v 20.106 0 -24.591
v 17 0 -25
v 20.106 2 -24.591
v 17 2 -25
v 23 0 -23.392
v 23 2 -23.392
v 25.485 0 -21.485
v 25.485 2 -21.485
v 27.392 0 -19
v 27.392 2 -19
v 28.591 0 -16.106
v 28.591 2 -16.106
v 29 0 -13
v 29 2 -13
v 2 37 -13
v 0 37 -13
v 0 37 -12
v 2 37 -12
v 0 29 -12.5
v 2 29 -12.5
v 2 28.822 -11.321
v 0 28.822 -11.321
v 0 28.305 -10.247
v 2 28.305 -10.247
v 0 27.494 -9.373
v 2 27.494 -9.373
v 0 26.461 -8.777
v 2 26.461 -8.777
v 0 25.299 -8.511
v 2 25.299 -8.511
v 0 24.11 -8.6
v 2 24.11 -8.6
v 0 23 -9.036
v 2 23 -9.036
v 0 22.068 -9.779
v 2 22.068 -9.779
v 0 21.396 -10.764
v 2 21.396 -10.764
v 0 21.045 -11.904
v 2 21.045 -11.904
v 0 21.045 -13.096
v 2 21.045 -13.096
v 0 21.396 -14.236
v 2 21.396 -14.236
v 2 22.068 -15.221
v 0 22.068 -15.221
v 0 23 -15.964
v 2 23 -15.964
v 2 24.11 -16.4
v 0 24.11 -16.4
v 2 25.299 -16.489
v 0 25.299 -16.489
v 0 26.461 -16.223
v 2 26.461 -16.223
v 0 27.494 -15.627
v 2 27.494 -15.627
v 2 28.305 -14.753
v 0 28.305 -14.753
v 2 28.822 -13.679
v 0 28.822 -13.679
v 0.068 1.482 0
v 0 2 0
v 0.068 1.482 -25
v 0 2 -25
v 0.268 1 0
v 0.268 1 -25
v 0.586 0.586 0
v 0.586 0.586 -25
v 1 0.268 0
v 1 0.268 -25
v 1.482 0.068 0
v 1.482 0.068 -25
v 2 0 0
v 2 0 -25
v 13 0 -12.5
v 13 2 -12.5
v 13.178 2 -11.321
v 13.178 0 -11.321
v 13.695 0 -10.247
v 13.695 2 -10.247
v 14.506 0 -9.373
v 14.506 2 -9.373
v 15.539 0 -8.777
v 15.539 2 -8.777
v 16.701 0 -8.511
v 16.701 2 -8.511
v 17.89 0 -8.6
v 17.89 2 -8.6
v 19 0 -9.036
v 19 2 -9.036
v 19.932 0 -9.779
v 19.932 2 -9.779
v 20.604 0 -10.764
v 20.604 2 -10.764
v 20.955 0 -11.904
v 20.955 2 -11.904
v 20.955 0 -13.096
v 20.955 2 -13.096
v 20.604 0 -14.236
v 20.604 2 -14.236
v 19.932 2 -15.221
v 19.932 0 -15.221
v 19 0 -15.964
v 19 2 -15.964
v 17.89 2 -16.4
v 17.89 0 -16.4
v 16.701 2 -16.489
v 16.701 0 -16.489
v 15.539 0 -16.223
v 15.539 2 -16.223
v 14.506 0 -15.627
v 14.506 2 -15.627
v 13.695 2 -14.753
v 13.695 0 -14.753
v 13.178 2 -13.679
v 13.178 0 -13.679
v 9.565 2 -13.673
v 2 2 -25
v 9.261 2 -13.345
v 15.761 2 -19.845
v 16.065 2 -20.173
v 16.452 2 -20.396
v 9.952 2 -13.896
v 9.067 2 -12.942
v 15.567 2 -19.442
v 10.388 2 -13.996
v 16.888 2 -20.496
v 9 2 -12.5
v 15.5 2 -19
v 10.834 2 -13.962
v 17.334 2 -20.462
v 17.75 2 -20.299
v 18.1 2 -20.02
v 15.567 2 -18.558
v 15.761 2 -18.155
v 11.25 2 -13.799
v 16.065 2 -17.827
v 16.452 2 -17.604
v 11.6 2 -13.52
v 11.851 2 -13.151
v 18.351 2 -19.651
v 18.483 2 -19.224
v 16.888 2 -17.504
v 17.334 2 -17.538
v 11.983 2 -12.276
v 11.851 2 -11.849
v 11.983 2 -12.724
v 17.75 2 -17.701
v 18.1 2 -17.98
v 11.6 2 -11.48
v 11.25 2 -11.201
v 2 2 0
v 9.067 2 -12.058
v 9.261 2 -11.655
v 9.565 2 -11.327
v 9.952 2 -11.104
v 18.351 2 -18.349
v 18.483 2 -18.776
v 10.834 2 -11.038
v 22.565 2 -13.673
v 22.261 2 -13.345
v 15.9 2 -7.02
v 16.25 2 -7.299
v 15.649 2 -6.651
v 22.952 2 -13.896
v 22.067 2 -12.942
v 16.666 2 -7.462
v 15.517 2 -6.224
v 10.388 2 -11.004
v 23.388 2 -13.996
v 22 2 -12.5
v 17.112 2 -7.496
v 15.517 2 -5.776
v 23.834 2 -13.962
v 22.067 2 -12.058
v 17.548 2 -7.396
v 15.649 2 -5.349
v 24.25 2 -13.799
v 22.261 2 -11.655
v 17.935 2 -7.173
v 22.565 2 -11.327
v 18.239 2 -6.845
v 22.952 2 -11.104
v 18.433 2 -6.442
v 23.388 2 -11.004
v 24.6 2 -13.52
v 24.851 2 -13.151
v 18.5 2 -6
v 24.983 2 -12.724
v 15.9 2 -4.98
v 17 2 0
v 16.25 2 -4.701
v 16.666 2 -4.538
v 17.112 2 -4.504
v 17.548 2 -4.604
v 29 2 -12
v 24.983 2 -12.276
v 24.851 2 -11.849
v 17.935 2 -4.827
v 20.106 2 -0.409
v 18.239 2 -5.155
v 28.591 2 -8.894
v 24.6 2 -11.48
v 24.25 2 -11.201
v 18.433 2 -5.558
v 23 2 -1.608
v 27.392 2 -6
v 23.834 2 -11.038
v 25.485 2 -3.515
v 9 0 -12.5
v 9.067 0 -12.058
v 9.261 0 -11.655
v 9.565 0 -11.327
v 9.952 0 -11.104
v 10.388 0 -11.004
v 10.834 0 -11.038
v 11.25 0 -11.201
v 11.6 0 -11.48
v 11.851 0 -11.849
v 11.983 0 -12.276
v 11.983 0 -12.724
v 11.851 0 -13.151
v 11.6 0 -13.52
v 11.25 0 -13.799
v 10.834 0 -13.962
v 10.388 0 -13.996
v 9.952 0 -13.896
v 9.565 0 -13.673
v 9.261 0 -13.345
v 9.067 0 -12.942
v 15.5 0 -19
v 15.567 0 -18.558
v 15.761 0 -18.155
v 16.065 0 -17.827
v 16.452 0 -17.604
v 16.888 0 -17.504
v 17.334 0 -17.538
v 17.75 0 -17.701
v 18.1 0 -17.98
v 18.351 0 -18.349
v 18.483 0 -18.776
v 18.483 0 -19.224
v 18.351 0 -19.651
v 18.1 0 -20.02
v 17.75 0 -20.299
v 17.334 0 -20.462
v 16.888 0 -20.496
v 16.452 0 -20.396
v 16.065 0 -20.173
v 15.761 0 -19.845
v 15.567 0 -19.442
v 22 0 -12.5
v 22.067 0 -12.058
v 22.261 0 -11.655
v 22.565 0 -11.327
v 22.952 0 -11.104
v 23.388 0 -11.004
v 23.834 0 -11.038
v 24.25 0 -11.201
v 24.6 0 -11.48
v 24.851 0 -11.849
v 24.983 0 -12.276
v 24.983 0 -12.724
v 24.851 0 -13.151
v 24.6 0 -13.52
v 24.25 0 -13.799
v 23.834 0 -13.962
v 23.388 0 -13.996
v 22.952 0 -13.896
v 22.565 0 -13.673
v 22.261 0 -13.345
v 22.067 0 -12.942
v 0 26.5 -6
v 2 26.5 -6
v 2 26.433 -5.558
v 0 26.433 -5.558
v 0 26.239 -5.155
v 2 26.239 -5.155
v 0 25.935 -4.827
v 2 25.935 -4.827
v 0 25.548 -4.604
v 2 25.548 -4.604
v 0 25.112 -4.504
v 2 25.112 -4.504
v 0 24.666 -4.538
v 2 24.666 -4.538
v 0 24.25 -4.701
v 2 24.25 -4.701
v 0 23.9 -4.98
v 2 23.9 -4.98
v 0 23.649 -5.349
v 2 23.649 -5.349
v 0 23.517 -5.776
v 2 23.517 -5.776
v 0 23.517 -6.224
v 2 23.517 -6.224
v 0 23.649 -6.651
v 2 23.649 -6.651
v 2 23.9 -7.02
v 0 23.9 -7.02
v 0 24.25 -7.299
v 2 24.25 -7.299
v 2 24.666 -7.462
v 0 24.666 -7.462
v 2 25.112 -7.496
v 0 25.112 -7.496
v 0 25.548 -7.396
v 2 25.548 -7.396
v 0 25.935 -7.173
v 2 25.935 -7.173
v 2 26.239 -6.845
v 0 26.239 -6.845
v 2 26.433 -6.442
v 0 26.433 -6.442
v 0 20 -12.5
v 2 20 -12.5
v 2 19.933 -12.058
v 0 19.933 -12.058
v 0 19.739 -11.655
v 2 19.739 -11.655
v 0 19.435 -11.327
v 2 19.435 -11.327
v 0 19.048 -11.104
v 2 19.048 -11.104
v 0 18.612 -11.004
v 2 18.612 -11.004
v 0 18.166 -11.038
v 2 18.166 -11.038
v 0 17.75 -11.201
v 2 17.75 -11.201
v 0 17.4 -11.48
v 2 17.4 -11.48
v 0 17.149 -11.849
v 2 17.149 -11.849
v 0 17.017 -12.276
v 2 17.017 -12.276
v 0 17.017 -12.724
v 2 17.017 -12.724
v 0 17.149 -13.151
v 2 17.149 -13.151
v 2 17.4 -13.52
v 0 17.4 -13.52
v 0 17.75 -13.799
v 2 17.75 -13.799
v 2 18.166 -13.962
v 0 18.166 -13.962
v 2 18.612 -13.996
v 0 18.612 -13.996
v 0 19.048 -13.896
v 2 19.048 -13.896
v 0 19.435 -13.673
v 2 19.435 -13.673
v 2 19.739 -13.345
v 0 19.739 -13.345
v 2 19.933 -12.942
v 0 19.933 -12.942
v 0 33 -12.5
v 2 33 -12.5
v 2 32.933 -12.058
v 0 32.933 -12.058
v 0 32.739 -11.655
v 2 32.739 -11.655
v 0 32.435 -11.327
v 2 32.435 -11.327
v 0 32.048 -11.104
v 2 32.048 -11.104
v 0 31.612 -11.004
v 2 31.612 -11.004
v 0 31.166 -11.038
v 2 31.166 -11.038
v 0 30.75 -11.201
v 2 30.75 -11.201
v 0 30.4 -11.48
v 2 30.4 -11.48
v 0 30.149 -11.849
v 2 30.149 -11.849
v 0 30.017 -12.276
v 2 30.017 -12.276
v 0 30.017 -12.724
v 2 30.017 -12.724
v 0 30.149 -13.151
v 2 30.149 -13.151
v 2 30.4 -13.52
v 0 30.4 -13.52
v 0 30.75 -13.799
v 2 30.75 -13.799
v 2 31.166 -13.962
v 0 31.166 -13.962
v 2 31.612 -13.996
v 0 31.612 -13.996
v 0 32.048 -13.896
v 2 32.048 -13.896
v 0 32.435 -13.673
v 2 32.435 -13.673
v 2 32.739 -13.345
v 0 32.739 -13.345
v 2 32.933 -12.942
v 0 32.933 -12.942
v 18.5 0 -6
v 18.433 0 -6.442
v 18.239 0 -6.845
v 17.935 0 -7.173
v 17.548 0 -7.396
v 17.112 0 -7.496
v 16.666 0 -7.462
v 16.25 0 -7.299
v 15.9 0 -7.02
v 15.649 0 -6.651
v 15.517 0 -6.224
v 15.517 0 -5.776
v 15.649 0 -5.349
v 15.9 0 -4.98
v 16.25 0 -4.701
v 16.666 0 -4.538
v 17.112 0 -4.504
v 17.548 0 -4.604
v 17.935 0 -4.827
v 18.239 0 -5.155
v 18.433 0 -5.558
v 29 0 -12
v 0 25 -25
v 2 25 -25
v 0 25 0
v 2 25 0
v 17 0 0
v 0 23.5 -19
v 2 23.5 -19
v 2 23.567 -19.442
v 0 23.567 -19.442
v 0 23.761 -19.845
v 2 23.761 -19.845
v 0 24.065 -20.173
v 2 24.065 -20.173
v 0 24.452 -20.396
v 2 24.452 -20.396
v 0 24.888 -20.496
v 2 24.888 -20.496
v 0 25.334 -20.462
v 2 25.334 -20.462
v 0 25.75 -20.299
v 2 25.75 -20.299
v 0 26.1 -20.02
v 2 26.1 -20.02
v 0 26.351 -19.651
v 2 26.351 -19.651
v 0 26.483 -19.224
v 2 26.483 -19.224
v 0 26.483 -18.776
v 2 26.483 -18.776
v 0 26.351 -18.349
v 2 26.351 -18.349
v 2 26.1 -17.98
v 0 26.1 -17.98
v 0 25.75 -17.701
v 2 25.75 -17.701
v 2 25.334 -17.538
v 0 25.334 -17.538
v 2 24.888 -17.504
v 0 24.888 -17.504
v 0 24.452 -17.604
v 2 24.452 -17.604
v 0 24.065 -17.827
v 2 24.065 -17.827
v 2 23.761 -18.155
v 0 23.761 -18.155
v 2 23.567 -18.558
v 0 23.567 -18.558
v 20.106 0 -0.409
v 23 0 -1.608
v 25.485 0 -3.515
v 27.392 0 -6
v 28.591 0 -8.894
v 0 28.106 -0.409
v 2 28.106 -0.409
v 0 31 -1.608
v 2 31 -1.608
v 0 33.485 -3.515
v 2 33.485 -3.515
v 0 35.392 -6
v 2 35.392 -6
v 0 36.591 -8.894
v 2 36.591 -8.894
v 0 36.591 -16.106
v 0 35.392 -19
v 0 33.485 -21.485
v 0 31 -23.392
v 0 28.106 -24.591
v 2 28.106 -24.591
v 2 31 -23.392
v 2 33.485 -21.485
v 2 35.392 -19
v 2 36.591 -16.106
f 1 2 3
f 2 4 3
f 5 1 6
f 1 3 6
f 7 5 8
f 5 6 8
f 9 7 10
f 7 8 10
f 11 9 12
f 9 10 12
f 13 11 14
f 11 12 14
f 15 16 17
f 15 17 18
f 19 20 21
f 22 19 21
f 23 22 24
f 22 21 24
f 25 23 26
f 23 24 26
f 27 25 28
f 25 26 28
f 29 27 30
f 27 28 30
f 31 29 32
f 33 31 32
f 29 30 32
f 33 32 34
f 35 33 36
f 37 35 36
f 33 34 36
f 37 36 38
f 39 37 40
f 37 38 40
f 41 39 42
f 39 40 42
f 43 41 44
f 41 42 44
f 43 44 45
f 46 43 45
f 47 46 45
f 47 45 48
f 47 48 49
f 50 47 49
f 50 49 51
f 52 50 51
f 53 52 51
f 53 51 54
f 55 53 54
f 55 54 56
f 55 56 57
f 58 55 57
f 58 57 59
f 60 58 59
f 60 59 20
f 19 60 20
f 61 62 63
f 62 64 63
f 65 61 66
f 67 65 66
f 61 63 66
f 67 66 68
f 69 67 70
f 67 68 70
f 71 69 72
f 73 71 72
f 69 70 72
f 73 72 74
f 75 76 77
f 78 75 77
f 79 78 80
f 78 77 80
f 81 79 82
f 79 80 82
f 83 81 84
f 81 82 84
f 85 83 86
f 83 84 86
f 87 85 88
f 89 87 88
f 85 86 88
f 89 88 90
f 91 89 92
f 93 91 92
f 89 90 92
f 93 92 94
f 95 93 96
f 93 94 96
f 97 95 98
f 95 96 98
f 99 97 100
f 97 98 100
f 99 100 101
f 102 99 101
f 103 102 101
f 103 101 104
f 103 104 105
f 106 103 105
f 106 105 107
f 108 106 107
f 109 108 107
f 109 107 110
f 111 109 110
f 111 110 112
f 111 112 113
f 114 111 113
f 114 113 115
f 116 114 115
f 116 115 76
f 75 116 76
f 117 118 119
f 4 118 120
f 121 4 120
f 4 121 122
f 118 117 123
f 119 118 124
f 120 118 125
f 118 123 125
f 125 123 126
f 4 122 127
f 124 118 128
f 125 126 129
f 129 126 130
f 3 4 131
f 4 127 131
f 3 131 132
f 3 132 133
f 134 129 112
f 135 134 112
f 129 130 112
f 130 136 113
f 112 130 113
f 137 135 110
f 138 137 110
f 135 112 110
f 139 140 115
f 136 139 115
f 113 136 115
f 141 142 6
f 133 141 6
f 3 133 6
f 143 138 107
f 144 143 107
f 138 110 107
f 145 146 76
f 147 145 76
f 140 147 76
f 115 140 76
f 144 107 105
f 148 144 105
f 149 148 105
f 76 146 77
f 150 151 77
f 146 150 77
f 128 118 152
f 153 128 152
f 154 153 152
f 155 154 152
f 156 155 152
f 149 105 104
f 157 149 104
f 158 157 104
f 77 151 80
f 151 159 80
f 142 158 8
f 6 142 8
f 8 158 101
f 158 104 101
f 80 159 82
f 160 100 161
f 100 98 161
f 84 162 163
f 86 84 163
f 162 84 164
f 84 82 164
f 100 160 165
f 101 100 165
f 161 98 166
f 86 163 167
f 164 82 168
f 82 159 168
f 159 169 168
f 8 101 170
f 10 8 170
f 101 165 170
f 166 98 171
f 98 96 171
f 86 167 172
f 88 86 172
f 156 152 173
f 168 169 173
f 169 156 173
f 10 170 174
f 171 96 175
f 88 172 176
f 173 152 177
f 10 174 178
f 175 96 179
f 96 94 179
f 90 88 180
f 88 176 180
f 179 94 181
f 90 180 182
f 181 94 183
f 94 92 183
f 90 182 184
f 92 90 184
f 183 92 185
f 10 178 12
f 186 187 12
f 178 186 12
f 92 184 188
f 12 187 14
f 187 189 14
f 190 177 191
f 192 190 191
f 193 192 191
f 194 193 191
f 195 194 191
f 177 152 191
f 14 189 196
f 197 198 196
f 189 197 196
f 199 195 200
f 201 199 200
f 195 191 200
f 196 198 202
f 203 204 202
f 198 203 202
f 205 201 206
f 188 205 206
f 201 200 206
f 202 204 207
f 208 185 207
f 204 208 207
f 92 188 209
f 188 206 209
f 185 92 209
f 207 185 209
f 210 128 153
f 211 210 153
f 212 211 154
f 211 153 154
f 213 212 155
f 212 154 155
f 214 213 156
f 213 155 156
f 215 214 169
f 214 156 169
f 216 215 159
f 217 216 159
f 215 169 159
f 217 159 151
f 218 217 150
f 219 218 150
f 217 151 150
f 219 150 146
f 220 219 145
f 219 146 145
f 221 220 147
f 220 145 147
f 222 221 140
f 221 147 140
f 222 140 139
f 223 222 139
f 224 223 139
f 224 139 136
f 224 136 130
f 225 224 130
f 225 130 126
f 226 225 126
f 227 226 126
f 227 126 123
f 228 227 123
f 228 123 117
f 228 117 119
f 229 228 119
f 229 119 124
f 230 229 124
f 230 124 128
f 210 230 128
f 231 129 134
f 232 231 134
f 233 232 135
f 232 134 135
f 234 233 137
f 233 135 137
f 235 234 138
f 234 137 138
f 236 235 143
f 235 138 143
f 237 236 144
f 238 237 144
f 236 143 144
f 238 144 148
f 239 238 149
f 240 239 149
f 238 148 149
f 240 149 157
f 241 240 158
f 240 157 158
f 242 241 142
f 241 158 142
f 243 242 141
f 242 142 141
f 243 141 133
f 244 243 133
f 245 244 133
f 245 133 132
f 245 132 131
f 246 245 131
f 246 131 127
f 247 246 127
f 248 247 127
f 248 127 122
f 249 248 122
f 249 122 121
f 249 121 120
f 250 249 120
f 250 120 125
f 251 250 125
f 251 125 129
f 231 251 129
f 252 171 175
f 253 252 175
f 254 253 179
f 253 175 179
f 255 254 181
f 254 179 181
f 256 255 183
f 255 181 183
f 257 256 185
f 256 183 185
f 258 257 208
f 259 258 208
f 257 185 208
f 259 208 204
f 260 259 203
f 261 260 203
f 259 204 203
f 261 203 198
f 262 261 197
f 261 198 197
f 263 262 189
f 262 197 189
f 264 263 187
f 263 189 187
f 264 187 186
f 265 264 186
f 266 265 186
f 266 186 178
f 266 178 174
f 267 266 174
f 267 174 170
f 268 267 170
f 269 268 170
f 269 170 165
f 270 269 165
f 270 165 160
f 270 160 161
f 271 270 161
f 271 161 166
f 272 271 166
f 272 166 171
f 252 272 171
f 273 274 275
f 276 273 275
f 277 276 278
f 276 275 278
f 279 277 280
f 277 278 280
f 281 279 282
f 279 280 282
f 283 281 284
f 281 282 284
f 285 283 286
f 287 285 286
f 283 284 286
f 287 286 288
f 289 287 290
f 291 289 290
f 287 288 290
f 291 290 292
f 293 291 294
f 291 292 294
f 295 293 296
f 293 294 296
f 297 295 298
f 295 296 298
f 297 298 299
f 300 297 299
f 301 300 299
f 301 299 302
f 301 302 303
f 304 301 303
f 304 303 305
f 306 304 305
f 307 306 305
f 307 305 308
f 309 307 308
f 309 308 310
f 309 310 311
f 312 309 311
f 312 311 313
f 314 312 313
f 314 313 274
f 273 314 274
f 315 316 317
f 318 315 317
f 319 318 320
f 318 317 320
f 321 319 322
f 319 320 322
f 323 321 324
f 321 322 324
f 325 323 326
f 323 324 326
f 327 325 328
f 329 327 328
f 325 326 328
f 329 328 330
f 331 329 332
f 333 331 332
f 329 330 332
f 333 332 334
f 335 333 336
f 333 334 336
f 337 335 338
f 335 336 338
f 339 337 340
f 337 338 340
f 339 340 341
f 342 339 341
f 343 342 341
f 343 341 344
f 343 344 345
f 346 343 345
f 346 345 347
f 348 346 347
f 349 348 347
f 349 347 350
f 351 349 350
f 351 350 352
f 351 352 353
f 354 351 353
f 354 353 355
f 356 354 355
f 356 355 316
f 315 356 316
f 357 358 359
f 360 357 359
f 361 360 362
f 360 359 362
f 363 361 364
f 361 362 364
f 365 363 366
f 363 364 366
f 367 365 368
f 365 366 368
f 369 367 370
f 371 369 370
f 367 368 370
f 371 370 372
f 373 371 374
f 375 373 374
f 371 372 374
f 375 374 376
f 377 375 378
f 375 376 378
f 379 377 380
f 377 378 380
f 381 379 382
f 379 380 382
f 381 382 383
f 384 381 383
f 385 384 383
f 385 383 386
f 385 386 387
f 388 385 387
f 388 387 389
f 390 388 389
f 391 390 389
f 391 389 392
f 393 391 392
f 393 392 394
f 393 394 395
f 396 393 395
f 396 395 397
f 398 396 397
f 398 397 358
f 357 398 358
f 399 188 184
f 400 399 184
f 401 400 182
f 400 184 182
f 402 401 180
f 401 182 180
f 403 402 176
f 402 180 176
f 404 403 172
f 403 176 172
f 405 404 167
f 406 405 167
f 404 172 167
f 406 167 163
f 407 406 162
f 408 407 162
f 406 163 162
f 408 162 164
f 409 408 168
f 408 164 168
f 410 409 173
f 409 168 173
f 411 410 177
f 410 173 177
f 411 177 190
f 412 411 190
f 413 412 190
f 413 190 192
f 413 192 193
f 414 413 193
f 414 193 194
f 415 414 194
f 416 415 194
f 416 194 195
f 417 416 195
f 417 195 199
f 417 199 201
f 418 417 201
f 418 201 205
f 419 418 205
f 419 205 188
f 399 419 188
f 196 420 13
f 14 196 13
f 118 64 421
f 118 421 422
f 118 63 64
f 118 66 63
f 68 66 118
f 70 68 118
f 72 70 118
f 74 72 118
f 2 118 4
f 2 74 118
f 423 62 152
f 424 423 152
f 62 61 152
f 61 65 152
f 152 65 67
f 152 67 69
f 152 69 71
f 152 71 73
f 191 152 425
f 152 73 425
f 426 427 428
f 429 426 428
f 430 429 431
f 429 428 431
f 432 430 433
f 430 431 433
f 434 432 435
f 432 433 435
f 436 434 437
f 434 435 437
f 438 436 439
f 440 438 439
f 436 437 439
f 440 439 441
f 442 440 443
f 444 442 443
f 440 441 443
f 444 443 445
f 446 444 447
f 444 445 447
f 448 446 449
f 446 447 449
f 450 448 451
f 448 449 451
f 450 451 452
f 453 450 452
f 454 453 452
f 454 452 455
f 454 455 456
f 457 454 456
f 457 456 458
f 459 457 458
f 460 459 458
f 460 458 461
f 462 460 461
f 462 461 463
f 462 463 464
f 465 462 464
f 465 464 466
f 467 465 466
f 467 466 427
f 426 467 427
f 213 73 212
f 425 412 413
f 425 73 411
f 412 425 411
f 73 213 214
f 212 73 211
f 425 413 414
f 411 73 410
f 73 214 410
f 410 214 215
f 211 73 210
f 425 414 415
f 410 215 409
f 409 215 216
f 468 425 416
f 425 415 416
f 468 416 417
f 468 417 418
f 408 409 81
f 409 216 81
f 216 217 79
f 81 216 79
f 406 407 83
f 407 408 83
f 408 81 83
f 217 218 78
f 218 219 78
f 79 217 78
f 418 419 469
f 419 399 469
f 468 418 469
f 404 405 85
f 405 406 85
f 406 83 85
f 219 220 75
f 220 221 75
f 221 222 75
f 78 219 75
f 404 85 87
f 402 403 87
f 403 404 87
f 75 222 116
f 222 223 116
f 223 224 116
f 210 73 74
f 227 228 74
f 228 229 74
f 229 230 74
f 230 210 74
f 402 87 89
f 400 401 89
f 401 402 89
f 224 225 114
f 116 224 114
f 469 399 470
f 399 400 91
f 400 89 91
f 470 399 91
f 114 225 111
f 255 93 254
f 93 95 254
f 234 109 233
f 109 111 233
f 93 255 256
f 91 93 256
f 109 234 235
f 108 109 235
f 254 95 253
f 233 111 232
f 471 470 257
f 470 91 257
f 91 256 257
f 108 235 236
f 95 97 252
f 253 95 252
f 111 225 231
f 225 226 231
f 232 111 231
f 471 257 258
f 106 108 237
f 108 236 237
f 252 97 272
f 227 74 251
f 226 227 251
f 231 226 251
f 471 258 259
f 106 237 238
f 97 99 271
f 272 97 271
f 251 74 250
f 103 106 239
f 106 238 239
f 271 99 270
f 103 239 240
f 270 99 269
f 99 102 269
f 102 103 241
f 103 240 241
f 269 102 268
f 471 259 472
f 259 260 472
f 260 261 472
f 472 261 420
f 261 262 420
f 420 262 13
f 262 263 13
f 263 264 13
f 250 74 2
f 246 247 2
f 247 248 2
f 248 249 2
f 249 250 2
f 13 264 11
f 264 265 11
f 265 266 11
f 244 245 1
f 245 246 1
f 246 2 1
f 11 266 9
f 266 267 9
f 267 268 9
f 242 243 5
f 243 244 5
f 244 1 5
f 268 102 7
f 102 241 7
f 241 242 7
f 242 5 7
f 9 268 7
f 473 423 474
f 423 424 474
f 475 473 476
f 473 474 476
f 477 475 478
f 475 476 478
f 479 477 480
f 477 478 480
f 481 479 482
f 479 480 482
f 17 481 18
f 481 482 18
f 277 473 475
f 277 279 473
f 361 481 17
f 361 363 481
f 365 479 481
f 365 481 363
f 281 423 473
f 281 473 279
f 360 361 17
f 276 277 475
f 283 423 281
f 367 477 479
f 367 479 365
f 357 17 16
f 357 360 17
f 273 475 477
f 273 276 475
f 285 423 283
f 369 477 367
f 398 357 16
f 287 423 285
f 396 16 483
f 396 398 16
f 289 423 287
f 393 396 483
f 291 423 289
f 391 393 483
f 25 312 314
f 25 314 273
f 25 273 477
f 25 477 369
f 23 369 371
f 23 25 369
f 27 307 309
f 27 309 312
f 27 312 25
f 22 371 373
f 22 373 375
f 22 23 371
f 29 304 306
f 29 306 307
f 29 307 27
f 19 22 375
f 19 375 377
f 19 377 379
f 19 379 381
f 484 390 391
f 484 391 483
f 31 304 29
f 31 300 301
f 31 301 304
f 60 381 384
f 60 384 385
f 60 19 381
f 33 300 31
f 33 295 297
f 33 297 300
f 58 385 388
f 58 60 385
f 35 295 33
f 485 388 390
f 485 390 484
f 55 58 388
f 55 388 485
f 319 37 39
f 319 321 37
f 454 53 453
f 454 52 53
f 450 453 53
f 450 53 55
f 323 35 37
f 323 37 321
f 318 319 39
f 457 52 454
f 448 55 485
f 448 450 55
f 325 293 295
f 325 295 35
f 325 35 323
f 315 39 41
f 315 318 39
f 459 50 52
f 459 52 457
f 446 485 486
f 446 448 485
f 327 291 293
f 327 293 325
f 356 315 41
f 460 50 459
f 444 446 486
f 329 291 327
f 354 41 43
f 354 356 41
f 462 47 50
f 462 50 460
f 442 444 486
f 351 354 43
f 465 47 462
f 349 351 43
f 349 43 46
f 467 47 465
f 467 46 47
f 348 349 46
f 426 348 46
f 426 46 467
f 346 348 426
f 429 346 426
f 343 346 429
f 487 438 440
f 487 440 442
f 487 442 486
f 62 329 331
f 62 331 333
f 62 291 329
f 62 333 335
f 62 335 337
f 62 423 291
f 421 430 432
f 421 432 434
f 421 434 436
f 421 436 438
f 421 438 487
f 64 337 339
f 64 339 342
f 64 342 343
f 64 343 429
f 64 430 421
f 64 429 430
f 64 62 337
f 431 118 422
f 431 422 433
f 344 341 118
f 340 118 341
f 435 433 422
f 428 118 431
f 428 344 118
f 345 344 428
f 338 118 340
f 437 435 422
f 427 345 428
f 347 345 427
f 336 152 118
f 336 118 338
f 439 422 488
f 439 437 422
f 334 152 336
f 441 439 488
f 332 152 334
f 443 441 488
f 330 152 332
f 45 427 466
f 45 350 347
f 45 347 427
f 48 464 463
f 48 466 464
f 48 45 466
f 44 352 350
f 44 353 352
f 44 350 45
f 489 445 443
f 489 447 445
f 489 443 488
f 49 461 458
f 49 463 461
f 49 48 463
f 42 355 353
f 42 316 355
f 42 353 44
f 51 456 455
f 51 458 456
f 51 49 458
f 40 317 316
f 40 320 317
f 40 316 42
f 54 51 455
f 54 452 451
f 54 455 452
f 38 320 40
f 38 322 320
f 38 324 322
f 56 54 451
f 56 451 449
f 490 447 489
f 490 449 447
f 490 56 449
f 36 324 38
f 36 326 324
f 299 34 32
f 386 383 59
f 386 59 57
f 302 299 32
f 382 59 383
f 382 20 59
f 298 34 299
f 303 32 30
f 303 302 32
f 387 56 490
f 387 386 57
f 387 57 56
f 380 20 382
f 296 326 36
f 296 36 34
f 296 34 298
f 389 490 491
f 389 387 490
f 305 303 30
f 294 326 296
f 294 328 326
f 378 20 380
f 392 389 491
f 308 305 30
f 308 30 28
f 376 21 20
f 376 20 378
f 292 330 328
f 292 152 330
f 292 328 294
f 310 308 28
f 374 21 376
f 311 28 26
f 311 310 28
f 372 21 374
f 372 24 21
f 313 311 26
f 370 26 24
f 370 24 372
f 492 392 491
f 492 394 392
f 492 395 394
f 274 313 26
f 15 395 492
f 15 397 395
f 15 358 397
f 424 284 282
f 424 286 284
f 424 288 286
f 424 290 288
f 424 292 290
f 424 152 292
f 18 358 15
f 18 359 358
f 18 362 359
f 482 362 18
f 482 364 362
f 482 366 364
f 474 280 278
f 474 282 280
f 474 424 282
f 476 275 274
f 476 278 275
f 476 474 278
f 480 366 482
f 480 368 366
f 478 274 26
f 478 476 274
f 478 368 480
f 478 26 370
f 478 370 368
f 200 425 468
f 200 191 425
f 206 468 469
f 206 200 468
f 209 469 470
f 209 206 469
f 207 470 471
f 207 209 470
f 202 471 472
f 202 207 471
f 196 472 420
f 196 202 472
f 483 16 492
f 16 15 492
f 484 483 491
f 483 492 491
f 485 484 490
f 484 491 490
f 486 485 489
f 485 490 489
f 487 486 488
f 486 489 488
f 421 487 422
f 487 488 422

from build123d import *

# Parameters (mm, degrees)
SKETCH1_W           = 29
SKETCH1_H           = 25
BOSS_EXTRUDE1_DEPTH = 37
SKETCH2_W           = 27
SKETCH2_H           = 35
CUT_EXTRUDE1_DEPTH  = 37
FILLET1_R           = 2
SKETCH3_R           = 1.5
SKETCH3_R_2         = 4
CUT_EXTRUDE2_DEPTH  = 52.874849397
FILLET3_R           = 12
FILLET4_R           = 12
SKETCH5_R           = 1.5
SKETCH5_R_2         = 4
CUT_EXTRUDE3_DEPTH  = 53.182372503


with BuildPart() as part:
    # Sketch1 → Boss-Extrude1 (new body)
    with BuildSketch(Plane(origin=(0, 0, 0), x_dir=(1, 0, 0), z_dir=(0, 1, 0))):
        with Locations((14.5, 12.5)):
            Rectangle(SKETCH1_W, SKETCH1_H)
    extrude(amount=BOSS_EXTRUDE1_DEPTH)

    # Sketch2 → Cut-Extrude1 (cut)
    with BuildSketch(Plane.XY):
        with Locations((15.5, 19.5)):
            Rectangle(SKETCH2_W, SKETCH2_H)
    extrude(amount=-CUT_EXTRUDE1_DEPTH, mode=Mode.SUBTRACT)

    # Fillet1
    fillet1_edges = [part.edges().sort_by_distance(p)[0] for p in [
        (0, 0, -12.5),
    ]]
    fillet(fillet1_edges, radius=FILLET1_R)

    # Sketch3 → Cut-Extrude2 (cut, through all)
    with BuildSketch(Plane(origin=(0, 2, 0), x_dir=(1, 0, 0), z_dir=(0, 1, 0))):
        with Locations(Location((23.5, 12.5, 0), (0, 0, 180))):
            Circle(SKETCH3_R)
        with Locations(Location((17, 12.5, 0), (0, 0, 180))):
            Circle(SKETCH3_R_2)
        with Locations(Location((10.5, 12.5, 0), (0, 0, 180))):
            Circle(SKETCH3_R)
        with Locations(Location((17, 19, 0), (0, 0, 180))):
            Circle(SKETCH3_R)
        with Locations((17, 6)):
            Circle(SKETCH3_R)
    extrude(amount=-CUT_EXTRUDE2_DEPTH, mode=Mode.SUBTRACT)

    # Fillet3
    fillet3_edges = [part.edges().sort_by_distance(p)[0] for p in [
        (29, 1, -25),
        (29, 1, 0),
    ]]
    fillet(fillet3_edges, radius=FILLET3_R)

    # Fillet4
    fillet4_edges = [part.edges().sort_by_distance(p)[0] for p in [
        (1, 37, -25),
        (1, 37, 0),
    ]]
    fillet(fillet4_edges, radius=FILLET4_R)

    # Sketch5 → Cut-Extrude3 (cut, through all)
    with BuildSketch(Plane(origin=(2, 0, 0), x_dir=(0, 0, -1), z_dir=(1, 0, 0))):
        with Locations(Location((12.5, 31.5, 0), (0, 0, 90))):
            Circle(SKETCH5_R)
        with Locations(Location((12.5, 25, 0), (0, 0, 90))):
            Circle(SKETCH5_R_2)
        with Locations(Location((6, 25, 0), (0, 0, 90))):
            Circle(SKETCH5_R)
        with Locations(Location((19, 25, 0), (0, 0, 270))):
            Circle(SKETCH5_R)
        with Locations(Location((12.5, 18.5, 0), (0, 0, 90))):
            Circle(SKETCH5_R)
    extrude(amount=-CUT_EXTRUDE3_DEPTH, mode=Mode.SUBTRACT)


solid = part.part
